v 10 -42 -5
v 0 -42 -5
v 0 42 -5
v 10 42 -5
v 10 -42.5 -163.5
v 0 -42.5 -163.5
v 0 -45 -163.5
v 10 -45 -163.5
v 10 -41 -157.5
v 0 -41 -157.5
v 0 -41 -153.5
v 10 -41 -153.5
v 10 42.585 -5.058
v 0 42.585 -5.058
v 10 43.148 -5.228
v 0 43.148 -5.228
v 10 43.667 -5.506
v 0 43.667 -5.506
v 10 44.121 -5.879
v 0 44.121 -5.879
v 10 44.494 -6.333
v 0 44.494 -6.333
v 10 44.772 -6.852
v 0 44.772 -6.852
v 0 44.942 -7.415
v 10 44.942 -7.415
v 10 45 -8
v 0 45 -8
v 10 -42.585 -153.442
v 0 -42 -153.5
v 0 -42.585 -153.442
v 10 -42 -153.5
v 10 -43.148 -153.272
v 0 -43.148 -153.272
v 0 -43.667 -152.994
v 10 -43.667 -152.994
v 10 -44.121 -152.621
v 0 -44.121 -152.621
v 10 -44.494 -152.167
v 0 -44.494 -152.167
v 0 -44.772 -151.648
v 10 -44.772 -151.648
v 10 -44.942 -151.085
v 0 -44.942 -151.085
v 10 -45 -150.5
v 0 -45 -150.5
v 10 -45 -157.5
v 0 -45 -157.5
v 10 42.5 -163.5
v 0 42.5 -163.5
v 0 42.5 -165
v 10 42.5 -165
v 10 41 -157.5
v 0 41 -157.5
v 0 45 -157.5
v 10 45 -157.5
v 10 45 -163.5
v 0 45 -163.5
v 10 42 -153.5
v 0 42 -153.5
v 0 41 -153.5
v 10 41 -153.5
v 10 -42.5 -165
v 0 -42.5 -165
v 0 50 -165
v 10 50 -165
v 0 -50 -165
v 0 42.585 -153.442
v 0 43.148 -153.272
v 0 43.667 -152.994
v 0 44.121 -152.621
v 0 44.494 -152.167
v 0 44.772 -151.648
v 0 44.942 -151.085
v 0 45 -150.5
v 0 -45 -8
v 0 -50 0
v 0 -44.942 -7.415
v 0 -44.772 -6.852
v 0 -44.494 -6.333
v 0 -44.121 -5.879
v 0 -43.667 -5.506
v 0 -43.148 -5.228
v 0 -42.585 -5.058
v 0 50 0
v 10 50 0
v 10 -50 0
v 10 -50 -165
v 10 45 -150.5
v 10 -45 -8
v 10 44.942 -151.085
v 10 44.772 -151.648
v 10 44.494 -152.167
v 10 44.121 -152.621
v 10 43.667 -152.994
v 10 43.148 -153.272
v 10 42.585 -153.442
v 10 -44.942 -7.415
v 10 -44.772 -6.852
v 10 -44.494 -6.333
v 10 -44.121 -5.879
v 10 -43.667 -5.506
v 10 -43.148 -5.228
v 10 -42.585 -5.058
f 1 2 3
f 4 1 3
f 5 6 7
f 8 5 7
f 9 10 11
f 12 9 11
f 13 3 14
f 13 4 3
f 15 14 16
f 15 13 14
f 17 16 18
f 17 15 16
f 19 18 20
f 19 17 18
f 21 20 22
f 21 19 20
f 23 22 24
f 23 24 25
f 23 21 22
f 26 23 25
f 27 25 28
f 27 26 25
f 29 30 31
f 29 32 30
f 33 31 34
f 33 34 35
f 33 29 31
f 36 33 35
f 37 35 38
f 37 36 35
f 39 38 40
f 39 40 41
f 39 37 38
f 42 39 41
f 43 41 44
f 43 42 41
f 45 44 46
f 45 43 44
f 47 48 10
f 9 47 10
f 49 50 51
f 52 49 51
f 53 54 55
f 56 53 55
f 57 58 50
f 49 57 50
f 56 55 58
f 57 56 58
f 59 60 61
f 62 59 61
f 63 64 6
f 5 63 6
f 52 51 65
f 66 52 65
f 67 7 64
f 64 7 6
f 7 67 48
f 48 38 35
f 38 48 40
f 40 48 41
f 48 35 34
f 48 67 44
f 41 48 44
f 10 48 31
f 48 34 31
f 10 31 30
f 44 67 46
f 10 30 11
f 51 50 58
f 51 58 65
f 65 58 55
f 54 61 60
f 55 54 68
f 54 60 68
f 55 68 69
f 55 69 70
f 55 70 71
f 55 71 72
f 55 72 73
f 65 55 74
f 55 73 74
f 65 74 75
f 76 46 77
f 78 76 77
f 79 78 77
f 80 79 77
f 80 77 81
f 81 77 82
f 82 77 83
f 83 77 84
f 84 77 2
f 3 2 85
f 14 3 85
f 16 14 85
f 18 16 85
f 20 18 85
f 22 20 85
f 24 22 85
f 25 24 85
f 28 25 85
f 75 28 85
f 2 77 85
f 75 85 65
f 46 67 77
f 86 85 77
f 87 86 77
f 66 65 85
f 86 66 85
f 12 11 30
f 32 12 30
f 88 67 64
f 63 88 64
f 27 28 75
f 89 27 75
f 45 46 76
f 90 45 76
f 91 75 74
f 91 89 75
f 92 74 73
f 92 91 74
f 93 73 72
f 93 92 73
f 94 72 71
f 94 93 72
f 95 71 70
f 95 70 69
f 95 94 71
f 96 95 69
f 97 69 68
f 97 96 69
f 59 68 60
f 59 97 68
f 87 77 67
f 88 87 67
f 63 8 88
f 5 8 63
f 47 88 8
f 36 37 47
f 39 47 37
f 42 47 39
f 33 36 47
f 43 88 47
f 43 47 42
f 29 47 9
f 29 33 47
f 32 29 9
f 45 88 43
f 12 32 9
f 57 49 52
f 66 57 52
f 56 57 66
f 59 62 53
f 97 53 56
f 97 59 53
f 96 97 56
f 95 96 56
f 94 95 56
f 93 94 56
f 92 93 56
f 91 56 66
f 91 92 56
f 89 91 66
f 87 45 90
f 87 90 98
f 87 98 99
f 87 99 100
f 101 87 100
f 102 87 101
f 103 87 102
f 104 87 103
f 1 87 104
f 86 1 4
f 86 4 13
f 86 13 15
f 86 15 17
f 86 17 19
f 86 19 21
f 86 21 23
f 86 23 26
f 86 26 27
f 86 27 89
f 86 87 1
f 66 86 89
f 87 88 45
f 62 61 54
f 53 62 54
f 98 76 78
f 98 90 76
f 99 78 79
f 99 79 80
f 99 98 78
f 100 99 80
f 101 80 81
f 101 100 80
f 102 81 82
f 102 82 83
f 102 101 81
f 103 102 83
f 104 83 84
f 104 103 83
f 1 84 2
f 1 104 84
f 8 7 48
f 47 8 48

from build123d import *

# Parameters (mm, degrees)
F1_DEPTH = 10
F2_R     = 3


with BuildPart() as f1:
    # F0 (on Right) → F1 (new body)
    with BuildSketch(Plane.YZ):
        Polygon((50, 0), (0, 0), (-50, 0), (-50, -165), (-42.5, -165), (-42.5, -163.5), (-45, -163.5), (-45, -157.5), (-41, -157.5), (-41, -153.5), (-45, -153.5), (-45, -5), (0, -5), (45, -5), (45, -153.5), (41, -153.5), (41, -157.5), (45, -157.5), (45, -163.5), (42.5, -163.5), (42.5, -165), (50, -165), align=None)
    extrude(amount=F1_DEPTH)

    # F2
    f2_edges = [f1.edges().sort_by_distance(p)[0] for p in [
        (5, -45, -5),
        (5, 45, -5),
        (5, 45, -153.5),
        (5, -45, -153.5),
    ]]
    fillet(f2_edges, radius=F2_R)


solid = f1.part
